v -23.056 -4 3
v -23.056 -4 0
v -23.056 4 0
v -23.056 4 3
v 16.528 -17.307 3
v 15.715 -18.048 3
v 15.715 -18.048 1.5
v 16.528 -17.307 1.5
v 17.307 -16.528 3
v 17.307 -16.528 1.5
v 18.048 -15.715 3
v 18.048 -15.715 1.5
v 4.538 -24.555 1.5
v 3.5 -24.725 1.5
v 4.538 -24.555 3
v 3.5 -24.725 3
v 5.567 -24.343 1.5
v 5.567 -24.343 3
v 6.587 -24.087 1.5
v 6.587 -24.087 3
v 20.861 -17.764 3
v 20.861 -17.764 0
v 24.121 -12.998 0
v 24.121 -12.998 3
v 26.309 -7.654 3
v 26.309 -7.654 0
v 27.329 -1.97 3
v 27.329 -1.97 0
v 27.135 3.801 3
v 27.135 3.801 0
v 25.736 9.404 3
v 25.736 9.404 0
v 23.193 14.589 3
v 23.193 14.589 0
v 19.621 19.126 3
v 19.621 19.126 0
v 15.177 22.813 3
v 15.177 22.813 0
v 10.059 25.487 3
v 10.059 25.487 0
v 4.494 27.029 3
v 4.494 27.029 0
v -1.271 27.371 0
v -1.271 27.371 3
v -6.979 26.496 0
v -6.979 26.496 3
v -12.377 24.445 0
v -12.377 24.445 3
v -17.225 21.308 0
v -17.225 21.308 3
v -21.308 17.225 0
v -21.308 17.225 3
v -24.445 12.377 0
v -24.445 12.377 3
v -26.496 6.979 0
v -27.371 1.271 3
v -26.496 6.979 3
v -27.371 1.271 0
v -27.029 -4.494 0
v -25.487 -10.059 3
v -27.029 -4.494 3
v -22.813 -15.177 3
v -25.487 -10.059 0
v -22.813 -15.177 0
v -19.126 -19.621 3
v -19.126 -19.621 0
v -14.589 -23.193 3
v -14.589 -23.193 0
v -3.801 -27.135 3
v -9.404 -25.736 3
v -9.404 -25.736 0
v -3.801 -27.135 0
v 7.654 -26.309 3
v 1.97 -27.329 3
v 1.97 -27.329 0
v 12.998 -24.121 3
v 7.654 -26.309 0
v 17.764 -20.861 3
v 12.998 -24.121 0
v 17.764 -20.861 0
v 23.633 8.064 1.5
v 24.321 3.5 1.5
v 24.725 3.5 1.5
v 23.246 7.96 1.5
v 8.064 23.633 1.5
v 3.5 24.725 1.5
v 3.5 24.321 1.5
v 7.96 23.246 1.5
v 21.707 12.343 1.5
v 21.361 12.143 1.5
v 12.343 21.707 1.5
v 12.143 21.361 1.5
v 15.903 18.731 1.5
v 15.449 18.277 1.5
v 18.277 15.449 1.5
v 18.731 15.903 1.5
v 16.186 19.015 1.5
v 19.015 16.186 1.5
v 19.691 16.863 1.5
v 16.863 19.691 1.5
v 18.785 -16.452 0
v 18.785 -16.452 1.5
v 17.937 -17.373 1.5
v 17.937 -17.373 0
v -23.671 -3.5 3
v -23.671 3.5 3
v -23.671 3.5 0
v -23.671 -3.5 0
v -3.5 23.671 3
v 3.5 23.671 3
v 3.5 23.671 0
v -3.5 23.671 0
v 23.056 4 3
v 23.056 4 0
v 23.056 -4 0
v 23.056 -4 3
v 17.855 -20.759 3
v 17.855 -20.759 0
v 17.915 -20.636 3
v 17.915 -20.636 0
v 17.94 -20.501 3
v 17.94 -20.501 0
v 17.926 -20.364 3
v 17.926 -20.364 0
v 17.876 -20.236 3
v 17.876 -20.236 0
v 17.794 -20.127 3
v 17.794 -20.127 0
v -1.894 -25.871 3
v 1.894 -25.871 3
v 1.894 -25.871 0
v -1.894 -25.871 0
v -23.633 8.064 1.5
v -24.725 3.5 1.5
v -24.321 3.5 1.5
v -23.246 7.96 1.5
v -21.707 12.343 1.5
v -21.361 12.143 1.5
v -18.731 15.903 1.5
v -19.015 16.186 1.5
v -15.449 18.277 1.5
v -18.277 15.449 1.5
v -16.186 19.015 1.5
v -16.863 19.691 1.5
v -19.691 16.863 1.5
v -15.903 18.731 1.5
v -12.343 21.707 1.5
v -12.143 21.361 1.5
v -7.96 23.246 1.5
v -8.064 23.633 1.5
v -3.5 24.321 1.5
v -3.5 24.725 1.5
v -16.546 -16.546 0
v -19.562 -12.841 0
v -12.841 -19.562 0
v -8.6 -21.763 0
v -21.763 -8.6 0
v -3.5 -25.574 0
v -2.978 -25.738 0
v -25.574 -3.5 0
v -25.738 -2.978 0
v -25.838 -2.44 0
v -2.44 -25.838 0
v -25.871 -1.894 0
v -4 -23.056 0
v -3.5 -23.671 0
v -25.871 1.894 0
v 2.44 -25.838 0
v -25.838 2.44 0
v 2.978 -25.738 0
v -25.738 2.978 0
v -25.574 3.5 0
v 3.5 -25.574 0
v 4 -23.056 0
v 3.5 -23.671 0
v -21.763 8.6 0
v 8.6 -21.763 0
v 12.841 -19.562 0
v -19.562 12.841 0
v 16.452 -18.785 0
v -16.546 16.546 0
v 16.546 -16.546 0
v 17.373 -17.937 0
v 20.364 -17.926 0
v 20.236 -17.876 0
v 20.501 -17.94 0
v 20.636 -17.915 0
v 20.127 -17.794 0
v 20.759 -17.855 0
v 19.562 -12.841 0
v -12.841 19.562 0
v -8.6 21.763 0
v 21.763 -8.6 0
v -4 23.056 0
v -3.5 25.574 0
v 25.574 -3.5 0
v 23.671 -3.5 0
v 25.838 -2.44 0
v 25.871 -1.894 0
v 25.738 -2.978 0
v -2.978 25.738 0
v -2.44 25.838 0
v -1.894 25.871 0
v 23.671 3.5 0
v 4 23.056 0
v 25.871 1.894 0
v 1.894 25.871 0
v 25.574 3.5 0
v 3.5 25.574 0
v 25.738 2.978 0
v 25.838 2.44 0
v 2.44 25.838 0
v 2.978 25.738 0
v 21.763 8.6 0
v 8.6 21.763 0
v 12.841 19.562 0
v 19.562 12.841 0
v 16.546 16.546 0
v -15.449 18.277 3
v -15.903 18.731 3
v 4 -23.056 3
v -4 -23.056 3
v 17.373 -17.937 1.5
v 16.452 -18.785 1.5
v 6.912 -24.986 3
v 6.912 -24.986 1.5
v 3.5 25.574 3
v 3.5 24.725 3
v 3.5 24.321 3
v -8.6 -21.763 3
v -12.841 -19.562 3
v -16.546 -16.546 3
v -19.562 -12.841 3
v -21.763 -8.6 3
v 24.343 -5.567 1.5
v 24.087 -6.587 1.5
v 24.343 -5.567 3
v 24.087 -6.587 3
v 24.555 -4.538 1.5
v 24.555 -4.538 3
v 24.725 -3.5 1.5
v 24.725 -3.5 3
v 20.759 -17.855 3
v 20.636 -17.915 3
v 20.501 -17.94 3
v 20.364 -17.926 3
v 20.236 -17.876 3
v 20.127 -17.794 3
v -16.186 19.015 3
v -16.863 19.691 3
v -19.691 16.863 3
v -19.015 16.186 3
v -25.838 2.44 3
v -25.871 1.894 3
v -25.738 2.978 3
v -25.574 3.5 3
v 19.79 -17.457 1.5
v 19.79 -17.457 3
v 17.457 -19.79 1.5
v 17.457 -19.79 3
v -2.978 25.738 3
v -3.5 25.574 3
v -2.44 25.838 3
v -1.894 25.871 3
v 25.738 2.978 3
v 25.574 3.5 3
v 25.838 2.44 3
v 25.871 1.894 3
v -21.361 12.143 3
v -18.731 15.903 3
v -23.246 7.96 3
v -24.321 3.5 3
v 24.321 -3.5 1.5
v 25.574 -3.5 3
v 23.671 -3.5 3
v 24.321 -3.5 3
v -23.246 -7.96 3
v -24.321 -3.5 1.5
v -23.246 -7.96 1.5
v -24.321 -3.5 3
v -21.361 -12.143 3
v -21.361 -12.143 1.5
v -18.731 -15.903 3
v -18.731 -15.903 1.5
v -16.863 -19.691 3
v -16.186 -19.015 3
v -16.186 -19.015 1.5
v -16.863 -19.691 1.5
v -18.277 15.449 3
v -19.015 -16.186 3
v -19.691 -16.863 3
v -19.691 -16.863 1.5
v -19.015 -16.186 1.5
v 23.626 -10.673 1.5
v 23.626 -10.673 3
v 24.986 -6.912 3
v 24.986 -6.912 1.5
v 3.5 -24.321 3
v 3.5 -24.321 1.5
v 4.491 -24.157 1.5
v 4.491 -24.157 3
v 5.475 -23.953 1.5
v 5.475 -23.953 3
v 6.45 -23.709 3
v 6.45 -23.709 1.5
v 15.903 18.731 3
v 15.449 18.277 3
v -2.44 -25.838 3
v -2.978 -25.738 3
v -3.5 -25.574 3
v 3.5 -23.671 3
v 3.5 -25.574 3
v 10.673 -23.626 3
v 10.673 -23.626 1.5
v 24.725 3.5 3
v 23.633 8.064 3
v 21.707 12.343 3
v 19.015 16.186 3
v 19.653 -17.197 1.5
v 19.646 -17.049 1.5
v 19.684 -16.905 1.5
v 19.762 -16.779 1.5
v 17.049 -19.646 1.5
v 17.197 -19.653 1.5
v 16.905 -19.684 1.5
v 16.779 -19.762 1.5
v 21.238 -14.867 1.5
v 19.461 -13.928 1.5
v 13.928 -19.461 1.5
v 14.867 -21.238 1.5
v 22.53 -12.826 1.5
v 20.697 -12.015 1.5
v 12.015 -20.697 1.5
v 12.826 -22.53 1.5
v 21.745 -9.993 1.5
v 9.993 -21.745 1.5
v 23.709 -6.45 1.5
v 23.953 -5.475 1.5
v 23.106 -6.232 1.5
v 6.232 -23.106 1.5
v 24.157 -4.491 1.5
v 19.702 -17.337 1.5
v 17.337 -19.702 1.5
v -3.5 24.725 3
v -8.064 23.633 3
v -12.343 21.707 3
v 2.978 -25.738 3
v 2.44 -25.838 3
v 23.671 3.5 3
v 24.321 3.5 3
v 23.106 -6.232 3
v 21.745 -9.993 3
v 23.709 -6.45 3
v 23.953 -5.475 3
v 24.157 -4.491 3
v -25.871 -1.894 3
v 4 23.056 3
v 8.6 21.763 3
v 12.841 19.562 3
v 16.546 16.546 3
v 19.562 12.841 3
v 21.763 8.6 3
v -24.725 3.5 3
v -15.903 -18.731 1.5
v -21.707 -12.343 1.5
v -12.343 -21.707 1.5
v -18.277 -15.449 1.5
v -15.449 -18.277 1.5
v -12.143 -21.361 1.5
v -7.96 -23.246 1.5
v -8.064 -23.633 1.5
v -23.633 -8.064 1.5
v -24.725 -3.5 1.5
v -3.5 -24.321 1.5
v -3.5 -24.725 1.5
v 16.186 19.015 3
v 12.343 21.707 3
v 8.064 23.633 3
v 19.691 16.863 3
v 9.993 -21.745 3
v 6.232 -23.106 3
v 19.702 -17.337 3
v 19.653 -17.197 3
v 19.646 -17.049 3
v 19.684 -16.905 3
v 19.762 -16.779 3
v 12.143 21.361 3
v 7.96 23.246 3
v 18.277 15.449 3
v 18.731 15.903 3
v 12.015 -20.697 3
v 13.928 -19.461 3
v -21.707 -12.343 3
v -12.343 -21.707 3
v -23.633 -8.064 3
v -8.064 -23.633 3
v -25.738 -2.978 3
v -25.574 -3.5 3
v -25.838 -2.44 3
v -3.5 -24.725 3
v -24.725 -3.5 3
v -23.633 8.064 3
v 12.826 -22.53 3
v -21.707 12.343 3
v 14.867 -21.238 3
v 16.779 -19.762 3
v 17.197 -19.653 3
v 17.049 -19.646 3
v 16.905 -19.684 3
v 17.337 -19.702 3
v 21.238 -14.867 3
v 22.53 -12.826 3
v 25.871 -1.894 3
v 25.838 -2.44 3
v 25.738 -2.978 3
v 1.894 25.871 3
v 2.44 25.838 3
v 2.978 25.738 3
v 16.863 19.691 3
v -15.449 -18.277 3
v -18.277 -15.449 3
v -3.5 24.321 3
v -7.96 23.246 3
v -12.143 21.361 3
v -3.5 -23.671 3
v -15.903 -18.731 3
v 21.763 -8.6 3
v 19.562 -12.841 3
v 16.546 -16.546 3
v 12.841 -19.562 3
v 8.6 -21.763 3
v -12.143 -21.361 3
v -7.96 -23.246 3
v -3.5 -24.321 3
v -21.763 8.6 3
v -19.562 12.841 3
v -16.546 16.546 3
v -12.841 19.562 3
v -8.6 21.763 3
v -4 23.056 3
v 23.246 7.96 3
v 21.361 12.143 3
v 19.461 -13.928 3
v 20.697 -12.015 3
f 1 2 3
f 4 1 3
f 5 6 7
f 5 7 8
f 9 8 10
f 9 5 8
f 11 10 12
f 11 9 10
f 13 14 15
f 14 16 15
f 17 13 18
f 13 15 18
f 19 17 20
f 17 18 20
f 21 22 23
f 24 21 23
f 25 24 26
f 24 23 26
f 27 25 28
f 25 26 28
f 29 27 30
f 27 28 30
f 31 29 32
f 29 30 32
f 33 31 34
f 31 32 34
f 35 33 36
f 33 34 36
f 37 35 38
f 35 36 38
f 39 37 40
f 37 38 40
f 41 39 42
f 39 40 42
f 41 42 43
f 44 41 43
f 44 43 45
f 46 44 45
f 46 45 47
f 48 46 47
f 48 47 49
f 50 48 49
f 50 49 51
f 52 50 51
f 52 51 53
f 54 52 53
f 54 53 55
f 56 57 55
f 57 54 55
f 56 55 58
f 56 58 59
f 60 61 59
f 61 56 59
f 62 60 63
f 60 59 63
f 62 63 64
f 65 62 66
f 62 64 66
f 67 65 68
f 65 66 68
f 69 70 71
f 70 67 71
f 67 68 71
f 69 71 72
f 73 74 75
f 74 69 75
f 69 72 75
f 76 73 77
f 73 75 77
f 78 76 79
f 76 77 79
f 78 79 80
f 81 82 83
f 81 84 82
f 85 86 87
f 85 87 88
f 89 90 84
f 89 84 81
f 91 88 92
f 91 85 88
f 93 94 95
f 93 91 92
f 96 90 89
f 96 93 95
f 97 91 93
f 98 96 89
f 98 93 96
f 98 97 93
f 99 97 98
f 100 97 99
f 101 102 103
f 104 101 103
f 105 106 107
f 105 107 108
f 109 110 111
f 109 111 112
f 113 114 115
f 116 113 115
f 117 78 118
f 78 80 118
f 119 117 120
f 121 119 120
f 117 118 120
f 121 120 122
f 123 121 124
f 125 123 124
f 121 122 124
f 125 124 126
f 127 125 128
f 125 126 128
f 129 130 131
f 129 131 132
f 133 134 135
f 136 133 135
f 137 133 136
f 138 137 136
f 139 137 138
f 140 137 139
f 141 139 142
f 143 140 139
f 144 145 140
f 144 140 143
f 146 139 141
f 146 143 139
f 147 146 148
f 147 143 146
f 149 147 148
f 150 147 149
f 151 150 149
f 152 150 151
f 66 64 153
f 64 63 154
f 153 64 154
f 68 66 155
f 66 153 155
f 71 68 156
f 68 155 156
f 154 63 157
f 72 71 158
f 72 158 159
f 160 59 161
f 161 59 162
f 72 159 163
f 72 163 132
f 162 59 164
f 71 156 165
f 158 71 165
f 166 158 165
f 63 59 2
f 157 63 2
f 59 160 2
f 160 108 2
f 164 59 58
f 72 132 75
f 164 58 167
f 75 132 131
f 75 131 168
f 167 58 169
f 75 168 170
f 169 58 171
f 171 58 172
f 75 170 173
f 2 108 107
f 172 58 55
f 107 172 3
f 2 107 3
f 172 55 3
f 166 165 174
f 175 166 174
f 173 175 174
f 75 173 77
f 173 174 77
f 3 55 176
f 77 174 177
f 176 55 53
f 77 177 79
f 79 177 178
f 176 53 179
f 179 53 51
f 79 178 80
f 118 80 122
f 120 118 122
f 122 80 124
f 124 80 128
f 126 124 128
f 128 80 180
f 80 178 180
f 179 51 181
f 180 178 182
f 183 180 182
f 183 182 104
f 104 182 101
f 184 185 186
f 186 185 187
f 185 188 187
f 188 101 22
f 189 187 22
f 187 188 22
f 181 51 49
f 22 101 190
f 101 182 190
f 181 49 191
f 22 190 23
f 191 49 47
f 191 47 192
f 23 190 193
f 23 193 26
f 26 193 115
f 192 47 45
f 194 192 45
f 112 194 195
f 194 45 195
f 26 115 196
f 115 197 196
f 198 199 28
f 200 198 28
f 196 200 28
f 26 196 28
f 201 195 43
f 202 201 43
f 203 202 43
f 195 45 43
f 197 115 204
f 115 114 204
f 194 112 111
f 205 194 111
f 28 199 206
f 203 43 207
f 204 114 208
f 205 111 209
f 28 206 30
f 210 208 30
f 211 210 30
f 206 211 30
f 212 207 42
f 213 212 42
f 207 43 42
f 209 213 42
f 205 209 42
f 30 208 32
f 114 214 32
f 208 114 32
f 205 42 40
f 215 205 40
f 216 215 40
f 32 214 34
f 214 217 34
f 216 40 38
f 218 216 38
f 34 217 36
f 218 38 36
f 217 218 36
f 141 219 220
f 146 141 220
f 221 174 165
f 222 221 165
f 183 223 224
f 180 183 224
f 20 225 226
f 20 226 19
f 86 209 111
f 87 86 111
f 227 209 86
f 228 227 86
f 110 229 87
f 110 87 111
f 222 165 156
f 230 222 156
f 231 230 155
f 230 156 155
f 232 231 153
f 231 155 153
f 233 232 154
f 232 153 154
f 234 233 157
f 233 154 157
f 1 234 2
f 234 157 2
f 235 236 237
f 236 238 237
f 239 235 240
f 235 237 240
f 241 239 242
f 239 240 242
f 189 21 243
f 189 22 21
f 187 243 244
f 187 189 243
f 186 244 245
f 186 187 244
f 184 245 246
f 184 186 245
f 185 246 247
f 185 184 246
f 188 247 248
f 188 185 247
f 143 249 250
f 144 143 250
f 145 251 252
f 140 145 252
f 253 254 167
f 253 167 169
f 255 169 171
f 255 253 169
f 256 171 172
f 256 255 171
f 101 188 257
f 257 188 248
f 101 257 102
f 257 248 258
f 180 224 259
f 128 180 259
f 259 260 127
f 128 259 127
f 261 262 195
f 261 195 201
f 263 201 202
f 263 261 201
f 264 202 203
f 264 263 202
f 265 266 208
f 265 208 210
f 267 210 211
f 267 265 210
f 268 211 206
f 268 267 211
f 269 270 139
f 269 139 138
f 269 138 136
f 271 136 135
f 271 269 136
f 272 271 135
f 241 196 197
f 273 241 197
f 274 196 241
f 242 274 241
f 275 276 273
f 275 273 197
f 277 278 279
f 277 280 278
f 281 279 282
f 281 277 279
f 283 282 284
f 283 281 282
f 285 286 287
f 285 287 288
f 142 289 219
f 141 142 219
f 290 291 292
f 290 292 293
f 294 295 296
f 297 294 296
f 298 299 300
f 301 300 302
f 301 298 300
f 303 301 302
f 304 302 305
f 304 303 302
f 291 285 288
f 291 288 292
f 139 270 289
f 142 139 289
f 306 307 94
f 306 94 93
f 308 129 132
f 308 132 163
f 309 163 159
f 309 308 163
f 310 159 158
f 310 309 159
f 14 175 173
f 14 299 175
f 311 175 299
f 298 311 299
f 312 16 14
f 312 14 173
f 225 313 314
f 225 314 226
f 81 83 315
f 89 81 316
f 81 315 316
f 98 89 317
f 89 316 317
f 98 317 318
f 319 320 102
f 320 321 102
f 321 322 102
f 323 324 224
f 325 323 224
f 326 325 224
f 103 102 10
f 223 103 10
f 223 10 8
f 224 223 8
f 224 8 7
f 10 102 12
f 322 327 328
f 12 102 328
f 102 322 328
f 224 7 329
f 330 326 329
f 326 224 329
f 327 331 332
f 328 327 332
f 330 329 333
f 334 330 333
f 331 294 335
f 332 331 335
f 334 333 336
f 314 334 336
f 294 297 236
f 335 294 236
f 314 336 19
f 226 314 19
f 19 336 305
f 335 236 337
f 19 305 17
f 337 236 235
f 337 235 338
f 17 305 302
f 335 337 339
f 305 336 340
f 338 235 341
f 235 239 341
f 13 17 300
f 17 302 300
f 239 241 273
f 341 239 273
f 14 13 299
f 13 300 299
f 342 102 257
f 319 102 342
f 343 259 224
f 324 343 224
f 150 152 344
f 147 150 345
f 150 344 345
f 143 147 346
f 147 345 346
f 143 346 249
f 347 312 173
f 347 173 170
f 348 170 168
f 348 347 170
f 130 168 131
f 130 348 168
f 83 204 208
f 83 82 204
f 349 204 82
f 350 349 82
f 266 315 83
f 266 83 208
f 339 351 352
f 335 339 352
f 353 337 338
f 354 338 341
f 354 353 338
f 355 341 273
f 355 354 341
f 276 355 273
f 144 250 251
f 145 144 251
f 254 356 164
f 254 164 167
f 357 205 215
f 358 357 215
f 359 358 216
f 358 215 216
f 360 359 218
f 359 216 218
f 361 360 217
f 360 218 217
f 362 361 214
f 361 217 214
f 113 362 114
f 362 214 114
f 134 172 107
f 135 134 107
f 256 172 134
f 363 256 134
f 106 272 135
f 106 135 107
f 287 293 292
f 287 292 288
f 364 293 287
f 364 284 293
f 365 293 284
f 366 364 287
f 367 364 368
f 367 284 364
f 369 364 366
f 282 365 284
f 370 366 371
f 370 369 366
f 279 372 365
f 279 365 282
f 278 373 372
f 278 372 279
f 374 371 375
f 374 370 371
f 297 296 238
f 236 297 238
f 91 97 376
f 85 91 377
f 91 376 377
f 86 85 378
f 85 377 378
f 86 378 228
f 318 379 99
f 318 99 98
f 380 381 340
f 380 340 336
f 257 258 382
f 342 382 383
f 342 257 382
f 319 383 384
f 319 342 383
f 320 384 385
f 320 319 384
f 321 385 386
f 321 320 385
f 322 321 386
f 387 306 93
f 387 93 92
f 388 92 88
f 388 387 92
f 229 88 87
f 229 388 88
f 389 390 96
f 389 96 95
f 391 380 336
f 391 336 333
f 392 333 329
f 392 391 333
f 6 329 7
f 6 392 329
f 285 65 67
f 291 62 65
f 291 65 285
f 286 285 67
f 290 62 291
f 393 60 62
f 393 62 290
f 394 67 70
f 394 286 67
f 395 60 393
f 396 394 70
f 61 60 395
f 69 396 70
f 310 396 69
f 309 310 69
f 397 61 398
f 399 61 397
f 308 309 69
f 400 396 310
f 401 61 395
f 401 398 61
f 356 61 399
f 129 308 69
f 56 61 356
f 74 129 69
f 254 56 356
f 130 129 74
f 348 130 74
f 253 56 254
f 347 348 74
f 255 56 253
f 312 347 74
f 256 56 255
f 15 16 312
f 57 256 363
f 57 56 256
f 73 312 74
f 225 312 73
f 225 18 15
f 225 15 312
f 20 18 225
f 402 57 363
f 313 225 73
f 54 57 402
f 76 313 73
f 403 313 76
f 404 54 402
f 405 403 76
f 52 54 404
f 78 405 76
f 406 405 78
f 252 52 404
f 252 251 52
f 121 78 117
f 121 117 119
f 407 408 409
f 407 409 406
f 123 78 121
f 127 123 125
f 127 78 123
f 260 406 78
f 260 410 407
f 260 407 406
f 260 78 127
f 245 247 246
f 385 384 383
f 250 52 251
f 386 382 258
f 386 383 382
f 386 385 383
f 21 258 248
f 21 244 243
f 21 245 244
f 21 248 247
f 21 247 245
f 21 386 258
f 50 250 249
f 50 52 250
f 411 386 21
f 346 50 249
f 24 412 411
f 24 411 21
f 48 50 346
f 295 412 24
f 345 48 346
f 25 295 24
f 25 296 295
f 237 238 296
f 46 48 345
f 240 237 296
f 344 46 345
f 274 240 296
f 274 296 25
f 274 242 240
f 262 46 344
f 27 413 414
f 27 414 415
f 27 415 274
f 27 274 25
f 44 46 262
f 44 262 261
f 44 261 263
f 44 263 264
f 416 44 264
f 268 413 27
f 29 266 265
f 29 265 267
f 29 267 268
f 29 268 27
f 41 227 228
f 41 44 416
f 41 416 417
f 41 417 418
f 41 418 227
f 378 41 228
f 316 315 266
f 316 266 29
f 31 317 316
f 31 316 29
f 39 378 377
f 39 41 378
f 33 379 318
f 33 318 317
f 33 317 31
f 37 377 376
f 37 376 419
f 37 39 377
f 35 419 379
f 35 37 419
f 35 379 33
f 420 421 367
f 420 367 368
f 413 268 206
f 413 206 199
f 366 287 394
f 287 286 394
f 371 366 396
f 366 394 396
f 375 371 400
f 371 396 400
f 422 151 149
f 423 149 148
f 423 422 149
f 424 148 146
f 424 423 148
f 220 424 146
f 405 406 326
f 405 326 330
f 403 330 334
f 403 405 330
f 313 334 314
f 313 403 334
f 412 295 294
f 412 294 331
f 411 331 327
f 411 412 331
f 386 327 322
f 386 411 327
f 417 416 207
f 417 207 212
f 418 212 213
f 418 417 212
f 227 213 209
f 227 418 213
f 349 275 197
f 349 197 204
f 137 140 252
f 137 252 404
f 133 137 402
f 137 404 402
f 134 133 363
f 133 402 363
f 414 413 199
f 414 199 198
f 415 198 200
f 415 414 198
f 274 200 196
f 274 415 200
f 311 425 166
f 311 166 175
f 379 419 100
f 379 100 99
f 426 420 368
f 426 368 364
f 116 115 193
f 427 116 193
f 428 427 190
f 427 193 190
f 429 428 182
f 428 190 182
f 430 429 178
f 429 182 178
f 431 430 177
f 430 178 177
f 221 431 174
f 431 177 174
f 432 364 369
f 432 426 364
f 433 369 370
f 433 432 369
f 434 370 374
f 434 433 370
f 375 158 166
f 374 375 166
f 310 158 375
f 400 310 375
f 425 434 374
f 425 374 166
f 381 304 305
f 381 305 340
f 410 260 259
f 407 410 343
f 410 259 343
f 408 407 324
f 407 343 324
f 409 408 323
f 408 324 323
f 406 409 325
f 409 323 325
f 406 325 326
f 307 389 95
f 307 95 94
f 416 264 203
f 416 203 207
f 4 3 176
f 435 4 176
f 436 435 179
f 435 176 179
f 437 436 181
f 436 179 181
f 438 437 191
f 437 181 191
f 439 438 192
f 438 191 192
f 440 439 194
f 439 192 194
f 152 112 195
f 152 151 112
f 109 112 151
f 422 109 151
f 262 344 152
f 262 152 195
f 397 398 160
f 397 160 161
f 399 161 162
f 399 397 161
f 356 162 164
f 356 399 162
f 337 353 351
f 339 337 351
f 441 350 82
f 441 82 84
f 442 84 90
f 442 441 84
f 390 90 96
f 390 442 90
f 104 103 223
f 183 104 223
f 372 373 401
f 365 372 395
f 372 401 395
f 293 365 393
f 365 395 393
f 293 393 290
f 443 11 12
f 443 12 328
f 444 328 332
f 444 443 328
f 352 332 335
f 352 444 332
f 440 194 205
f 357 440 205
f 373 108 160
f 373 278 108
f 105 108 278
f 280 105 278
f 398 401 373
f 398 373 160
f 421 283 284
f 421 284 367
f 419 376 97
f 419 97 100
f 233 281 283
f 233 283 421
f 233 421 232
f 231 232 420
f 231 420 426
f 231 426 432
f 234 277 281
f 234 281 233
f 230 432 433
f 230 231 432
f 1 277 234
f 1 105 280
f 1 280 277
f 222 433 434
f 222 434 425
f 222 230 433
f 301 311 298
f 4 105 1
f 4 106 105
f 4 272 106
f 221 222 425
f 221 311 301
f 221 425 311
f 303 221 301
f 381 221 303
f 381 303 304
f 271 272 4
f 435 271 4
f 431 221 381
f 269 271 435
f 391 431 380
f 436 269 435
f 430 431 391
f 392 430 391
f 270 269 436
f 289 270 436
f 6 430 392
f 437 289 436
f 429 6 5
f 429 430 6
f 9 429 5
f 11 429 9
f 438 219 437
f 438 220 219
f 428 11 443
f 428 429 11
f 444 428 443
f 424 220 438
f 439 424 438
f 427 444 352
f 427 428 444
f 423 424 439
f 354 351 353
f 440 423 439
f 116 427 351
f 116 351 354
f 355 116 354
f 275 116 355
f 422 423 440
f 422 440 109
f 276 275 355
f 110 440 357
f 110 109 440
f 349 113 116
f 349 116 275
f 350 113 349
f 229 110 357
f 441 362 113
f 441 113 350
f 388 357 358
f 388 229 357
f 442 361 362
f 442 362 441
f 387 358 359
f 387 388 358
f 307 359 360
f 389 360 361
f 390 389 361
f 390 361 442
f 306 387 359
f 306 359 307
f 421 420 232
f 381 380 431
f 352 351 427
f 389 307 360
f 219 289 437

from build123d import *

# Parameters (mm, degrees)
SKETCH2_R       = 27.4
EXTRUDE1_DEPTH  = 3
EXTRUDE2_DEPTH  = 3
SKETCH5_R       = 24.971147558
SKETCH5_R_2     = 24.571147558
EXTRUDE3_DEPTH  = 1.5
EXTRUDE4_DEPTH  = 1.5
EXTRUDE11_DEPTH = 3.8
EXTRUDE12_DEPTH = 1.5
FILLET1_R       = 0.5


with BuildPart() as part:
    # Sketch2 → Extrude1 (new body)
    with BuildSketch(Plane.XY):
        Circle(SKETCH2_R)
        with BuildLine():
            Line((-4, 23.055585007), (4, 23.055585007))
            ThreePointArc((4, 23.055585007), (16.54629868, 16.54629868), (23.055585007, 4))
            Line((23.055585007, 4), (23.055585007, -4))
            ThreePointArc((23.055585007, -4), (16.54629868, -16.54629868), (4, -23.055585007))
            Line((4, -23.055585007), (-4, -23.055585007))
            ThreePointArc((-4, -23.055585007), (-16.54629868, -16.54629868), (-23.055585007, -4))
            Line((-23.055585007, -4), (-23.055585007, 4))
            ThreePointArc((-23.055585007, 4), (-16.54629868, 16.54629868), (-4, 23.055585007))
        make_face(mode=Mode.SUBTRACT)
    extrude(amount=EXTRUDE1_DEPTH)

    # Sketch3 → Extrude2 (cut)
    with BuildSketch(Plane.XY.offset(3)):
        with BuildLine():
            Line((-1.893881028, 25.871147558), (1.893881028, 25.871147558))
            ThreePointArc((1.893881028, 25.871147558), (2.710560642, 25.796258258), (3.5, 25.574088282))
            Line((3.5, 25.574088282), (3.5, 23.671147558))
            Line((3.5, 23.671147558), (-3.5, 23.671147558))
            Line((-3.5, 23.671147558), (-3.5, 25.574088282))
            ThreePointArc((-3.5, 25.574088282), (-2.710560642, 25.796258258), (-1.893881028, 25.871147558))
        make_face()
        with BuildLine():
            Line((23.671147558, -3.5), (23.671147558, 3.5))
            Line((23.671147558, 3.5), (25.574088282, 3.5))
            ThreePointArc((25.574088282, 3.5), (25.796258258, 2.710560642), (25.871147558, 1.893881028))
            Line((25.871147558, 1.893881028), (25.871147558, -1.893881028))
            ThreePointArc((25.871147558, -1.893881028), (25.796258258, -2.710560642), (25.574088282, -3.5))
            Line((25.574088282, -3.5), (23.671147558, -3.5))
        make_face()
        with BuildLine():
            Line((-3.5, -23.671147558), (3.5, -23.671147558))
            Line((3.5, -23.671147558), (3.5, -25.574088282))
            ThreePointArc((3.5, -25.574088282), (2.710560642, -25.796258258), (1.893881028, -25.871147558))
            Line((1.893881028, -25.871147558), (-1.893881028, -25.871147558))
            ThreePointArc((-1.893881028, -25.871147558), (-2.710560642, -25.796258258), (-3.5, -25.574088282))
            Line((-3.5, -25.574088282), (-3.5, -23.671147558))
        make_face()
        with BuildLine():
            Line((-23.671147558, 3.5), (-23.671147558, -3.5))
            Line((-23.671147558, -3.5), (-25.574088282, -3.5))
            ThreePointArc((-25.574088282, -3.5), (-25.796258258, -2.710560642), (-25.871147558, -1.893881028))
            Line((-25.871147558, -1.893881028), (-25.871147558, 1.893881028))
            ThreePointArc((-25.871147558, 1.893881028), (-25.796258258, 2.710560642), (-25.574088282, 3.5))
            Line((-25.574088282, 3.5), (-23.671147558, 3.5))
        make_face()
    extrude(amount=-EXTRUDE2_DEPTH, mode=Mode.SUBTRACT)

    # Sketch5 → Extrude3 (cut)
    with BuildSketch(Plane.XY.offset(3)):
        Circle(SKETCH5_R)
        Circle(SKETCH5_R_2, mode=Mode.SUBTRACT)
    extrude(amount=-EXTRUDE3_DEPTH, mode=Mode.SUBTRACT)

    # Sketch6 → Extrude4 (cut)
    with BuildSketch(Plane.XY.offset(3)):
        Polygon((-19.691237457, 16.862810332), (-18.277023894, 15.448596769), (-15.448596769, 18.277023894), (-16.862810332, 19.691237457), align=None)
        Polygon((16.862810332, 19.691237457), (19.691237457, 16.862810332), (18.277023894, 15.448596769), (15.448596769, 18.277023894), align=None)
        Polygon((-19.691237457, -16.862810332), (-18.277023894, -15.448596769), (-15.448596769, -18.277023894), (-16.862810332, -19.691237457), align=None)
        Polygon((6.912025, -24.986458638), (6.231672227, -23.105735345), (9.993118813, -21.745029799), (10.673471586, -23.625753092), align=None)
        Polygon((24.986458638, -6.912025), (23.105735345, -6.231672227), (21.745029799, -9.993118813), (23.625753092, -10.673471586), align=None)
    extrude(amount=-EXTRUDE4_DEPTH, mode=Mode.SUBTRACT)

    # Sketch13 → Extrude11 (cut)
    with BuildSketch(Plane.XY.offset(3)):
        Polygon((19.975766569, -17.642314191), (18.785405345, -16.451952967), (17.936646698, -17.373396778), (17.373396778, -17.936646698), (16.451952967, -18.785405345), (17.642314191, -19.975766569), (19.180190393, -21.513642771), (21.513642771, -19.180190393), align=None)
    extrude(amount=-EXTRUDE11_DEPTH, mode=Mode.SUBTRACT)

    # Sketch14 → Extrude12 (cut)
    with BuildSketch(Plane.XY.offset(3)):
        with BuildLine():
            Line((10.673471586, -23.625753092), (10.279766704, -22.537420726))
            Line((10.279766704, -22.537420726), (9.993118813, -21.745029799))
            ThreePointArc((9.993118813, -21.745029799), (12.986268088, -20.101382682), (15.715013126, -18.048465504))
            ThreePointArc((15.715013126, -18.048465504), (16.922008518, -16.922008518), (18.048465504, -15.715013126))
            ThreePointArc((18.048465504, -15.715013126), (20.101382682, -12.986268088), (21.745029799, -9.993118813))
            Line((21.745029799, -9.993118813), (22.537420726, -10.279766704))
            Line((22.537420726, -10.279766704), (23.625753092, -10.673471586))
            ThreePointArc((23.625753092, -10.673471586), (21.783851689, -14.055710955), (19.461215863, -17.127763485))
            Line((19.461215863, -17.127763485), (17.127763485, -19.461215863))
            ThreePointArc((17.127763485, -19.461215863), (14.055710955, -21.783851689), (10.673471586, -23.625753092))
        make_face()
    extrude(amount=-EXTRUDE12_DEPTH, mode=Mode.SUBTRACT)

    # Fillet1
    fillet1_edges = [part.edges().sort_by_distance(p)[0] for p in [
        (20.506290558, -18.17283818, 1.5),
        (18.17283818, -20.506290558, 1.5),
        (17.127763485, -19.461215863, 2.25),
        (19.461215863, -17.127763485, 2.25),
    ]]
    fillet(fillet1_edges, radius=FILLET1_R)


solid = part.part
